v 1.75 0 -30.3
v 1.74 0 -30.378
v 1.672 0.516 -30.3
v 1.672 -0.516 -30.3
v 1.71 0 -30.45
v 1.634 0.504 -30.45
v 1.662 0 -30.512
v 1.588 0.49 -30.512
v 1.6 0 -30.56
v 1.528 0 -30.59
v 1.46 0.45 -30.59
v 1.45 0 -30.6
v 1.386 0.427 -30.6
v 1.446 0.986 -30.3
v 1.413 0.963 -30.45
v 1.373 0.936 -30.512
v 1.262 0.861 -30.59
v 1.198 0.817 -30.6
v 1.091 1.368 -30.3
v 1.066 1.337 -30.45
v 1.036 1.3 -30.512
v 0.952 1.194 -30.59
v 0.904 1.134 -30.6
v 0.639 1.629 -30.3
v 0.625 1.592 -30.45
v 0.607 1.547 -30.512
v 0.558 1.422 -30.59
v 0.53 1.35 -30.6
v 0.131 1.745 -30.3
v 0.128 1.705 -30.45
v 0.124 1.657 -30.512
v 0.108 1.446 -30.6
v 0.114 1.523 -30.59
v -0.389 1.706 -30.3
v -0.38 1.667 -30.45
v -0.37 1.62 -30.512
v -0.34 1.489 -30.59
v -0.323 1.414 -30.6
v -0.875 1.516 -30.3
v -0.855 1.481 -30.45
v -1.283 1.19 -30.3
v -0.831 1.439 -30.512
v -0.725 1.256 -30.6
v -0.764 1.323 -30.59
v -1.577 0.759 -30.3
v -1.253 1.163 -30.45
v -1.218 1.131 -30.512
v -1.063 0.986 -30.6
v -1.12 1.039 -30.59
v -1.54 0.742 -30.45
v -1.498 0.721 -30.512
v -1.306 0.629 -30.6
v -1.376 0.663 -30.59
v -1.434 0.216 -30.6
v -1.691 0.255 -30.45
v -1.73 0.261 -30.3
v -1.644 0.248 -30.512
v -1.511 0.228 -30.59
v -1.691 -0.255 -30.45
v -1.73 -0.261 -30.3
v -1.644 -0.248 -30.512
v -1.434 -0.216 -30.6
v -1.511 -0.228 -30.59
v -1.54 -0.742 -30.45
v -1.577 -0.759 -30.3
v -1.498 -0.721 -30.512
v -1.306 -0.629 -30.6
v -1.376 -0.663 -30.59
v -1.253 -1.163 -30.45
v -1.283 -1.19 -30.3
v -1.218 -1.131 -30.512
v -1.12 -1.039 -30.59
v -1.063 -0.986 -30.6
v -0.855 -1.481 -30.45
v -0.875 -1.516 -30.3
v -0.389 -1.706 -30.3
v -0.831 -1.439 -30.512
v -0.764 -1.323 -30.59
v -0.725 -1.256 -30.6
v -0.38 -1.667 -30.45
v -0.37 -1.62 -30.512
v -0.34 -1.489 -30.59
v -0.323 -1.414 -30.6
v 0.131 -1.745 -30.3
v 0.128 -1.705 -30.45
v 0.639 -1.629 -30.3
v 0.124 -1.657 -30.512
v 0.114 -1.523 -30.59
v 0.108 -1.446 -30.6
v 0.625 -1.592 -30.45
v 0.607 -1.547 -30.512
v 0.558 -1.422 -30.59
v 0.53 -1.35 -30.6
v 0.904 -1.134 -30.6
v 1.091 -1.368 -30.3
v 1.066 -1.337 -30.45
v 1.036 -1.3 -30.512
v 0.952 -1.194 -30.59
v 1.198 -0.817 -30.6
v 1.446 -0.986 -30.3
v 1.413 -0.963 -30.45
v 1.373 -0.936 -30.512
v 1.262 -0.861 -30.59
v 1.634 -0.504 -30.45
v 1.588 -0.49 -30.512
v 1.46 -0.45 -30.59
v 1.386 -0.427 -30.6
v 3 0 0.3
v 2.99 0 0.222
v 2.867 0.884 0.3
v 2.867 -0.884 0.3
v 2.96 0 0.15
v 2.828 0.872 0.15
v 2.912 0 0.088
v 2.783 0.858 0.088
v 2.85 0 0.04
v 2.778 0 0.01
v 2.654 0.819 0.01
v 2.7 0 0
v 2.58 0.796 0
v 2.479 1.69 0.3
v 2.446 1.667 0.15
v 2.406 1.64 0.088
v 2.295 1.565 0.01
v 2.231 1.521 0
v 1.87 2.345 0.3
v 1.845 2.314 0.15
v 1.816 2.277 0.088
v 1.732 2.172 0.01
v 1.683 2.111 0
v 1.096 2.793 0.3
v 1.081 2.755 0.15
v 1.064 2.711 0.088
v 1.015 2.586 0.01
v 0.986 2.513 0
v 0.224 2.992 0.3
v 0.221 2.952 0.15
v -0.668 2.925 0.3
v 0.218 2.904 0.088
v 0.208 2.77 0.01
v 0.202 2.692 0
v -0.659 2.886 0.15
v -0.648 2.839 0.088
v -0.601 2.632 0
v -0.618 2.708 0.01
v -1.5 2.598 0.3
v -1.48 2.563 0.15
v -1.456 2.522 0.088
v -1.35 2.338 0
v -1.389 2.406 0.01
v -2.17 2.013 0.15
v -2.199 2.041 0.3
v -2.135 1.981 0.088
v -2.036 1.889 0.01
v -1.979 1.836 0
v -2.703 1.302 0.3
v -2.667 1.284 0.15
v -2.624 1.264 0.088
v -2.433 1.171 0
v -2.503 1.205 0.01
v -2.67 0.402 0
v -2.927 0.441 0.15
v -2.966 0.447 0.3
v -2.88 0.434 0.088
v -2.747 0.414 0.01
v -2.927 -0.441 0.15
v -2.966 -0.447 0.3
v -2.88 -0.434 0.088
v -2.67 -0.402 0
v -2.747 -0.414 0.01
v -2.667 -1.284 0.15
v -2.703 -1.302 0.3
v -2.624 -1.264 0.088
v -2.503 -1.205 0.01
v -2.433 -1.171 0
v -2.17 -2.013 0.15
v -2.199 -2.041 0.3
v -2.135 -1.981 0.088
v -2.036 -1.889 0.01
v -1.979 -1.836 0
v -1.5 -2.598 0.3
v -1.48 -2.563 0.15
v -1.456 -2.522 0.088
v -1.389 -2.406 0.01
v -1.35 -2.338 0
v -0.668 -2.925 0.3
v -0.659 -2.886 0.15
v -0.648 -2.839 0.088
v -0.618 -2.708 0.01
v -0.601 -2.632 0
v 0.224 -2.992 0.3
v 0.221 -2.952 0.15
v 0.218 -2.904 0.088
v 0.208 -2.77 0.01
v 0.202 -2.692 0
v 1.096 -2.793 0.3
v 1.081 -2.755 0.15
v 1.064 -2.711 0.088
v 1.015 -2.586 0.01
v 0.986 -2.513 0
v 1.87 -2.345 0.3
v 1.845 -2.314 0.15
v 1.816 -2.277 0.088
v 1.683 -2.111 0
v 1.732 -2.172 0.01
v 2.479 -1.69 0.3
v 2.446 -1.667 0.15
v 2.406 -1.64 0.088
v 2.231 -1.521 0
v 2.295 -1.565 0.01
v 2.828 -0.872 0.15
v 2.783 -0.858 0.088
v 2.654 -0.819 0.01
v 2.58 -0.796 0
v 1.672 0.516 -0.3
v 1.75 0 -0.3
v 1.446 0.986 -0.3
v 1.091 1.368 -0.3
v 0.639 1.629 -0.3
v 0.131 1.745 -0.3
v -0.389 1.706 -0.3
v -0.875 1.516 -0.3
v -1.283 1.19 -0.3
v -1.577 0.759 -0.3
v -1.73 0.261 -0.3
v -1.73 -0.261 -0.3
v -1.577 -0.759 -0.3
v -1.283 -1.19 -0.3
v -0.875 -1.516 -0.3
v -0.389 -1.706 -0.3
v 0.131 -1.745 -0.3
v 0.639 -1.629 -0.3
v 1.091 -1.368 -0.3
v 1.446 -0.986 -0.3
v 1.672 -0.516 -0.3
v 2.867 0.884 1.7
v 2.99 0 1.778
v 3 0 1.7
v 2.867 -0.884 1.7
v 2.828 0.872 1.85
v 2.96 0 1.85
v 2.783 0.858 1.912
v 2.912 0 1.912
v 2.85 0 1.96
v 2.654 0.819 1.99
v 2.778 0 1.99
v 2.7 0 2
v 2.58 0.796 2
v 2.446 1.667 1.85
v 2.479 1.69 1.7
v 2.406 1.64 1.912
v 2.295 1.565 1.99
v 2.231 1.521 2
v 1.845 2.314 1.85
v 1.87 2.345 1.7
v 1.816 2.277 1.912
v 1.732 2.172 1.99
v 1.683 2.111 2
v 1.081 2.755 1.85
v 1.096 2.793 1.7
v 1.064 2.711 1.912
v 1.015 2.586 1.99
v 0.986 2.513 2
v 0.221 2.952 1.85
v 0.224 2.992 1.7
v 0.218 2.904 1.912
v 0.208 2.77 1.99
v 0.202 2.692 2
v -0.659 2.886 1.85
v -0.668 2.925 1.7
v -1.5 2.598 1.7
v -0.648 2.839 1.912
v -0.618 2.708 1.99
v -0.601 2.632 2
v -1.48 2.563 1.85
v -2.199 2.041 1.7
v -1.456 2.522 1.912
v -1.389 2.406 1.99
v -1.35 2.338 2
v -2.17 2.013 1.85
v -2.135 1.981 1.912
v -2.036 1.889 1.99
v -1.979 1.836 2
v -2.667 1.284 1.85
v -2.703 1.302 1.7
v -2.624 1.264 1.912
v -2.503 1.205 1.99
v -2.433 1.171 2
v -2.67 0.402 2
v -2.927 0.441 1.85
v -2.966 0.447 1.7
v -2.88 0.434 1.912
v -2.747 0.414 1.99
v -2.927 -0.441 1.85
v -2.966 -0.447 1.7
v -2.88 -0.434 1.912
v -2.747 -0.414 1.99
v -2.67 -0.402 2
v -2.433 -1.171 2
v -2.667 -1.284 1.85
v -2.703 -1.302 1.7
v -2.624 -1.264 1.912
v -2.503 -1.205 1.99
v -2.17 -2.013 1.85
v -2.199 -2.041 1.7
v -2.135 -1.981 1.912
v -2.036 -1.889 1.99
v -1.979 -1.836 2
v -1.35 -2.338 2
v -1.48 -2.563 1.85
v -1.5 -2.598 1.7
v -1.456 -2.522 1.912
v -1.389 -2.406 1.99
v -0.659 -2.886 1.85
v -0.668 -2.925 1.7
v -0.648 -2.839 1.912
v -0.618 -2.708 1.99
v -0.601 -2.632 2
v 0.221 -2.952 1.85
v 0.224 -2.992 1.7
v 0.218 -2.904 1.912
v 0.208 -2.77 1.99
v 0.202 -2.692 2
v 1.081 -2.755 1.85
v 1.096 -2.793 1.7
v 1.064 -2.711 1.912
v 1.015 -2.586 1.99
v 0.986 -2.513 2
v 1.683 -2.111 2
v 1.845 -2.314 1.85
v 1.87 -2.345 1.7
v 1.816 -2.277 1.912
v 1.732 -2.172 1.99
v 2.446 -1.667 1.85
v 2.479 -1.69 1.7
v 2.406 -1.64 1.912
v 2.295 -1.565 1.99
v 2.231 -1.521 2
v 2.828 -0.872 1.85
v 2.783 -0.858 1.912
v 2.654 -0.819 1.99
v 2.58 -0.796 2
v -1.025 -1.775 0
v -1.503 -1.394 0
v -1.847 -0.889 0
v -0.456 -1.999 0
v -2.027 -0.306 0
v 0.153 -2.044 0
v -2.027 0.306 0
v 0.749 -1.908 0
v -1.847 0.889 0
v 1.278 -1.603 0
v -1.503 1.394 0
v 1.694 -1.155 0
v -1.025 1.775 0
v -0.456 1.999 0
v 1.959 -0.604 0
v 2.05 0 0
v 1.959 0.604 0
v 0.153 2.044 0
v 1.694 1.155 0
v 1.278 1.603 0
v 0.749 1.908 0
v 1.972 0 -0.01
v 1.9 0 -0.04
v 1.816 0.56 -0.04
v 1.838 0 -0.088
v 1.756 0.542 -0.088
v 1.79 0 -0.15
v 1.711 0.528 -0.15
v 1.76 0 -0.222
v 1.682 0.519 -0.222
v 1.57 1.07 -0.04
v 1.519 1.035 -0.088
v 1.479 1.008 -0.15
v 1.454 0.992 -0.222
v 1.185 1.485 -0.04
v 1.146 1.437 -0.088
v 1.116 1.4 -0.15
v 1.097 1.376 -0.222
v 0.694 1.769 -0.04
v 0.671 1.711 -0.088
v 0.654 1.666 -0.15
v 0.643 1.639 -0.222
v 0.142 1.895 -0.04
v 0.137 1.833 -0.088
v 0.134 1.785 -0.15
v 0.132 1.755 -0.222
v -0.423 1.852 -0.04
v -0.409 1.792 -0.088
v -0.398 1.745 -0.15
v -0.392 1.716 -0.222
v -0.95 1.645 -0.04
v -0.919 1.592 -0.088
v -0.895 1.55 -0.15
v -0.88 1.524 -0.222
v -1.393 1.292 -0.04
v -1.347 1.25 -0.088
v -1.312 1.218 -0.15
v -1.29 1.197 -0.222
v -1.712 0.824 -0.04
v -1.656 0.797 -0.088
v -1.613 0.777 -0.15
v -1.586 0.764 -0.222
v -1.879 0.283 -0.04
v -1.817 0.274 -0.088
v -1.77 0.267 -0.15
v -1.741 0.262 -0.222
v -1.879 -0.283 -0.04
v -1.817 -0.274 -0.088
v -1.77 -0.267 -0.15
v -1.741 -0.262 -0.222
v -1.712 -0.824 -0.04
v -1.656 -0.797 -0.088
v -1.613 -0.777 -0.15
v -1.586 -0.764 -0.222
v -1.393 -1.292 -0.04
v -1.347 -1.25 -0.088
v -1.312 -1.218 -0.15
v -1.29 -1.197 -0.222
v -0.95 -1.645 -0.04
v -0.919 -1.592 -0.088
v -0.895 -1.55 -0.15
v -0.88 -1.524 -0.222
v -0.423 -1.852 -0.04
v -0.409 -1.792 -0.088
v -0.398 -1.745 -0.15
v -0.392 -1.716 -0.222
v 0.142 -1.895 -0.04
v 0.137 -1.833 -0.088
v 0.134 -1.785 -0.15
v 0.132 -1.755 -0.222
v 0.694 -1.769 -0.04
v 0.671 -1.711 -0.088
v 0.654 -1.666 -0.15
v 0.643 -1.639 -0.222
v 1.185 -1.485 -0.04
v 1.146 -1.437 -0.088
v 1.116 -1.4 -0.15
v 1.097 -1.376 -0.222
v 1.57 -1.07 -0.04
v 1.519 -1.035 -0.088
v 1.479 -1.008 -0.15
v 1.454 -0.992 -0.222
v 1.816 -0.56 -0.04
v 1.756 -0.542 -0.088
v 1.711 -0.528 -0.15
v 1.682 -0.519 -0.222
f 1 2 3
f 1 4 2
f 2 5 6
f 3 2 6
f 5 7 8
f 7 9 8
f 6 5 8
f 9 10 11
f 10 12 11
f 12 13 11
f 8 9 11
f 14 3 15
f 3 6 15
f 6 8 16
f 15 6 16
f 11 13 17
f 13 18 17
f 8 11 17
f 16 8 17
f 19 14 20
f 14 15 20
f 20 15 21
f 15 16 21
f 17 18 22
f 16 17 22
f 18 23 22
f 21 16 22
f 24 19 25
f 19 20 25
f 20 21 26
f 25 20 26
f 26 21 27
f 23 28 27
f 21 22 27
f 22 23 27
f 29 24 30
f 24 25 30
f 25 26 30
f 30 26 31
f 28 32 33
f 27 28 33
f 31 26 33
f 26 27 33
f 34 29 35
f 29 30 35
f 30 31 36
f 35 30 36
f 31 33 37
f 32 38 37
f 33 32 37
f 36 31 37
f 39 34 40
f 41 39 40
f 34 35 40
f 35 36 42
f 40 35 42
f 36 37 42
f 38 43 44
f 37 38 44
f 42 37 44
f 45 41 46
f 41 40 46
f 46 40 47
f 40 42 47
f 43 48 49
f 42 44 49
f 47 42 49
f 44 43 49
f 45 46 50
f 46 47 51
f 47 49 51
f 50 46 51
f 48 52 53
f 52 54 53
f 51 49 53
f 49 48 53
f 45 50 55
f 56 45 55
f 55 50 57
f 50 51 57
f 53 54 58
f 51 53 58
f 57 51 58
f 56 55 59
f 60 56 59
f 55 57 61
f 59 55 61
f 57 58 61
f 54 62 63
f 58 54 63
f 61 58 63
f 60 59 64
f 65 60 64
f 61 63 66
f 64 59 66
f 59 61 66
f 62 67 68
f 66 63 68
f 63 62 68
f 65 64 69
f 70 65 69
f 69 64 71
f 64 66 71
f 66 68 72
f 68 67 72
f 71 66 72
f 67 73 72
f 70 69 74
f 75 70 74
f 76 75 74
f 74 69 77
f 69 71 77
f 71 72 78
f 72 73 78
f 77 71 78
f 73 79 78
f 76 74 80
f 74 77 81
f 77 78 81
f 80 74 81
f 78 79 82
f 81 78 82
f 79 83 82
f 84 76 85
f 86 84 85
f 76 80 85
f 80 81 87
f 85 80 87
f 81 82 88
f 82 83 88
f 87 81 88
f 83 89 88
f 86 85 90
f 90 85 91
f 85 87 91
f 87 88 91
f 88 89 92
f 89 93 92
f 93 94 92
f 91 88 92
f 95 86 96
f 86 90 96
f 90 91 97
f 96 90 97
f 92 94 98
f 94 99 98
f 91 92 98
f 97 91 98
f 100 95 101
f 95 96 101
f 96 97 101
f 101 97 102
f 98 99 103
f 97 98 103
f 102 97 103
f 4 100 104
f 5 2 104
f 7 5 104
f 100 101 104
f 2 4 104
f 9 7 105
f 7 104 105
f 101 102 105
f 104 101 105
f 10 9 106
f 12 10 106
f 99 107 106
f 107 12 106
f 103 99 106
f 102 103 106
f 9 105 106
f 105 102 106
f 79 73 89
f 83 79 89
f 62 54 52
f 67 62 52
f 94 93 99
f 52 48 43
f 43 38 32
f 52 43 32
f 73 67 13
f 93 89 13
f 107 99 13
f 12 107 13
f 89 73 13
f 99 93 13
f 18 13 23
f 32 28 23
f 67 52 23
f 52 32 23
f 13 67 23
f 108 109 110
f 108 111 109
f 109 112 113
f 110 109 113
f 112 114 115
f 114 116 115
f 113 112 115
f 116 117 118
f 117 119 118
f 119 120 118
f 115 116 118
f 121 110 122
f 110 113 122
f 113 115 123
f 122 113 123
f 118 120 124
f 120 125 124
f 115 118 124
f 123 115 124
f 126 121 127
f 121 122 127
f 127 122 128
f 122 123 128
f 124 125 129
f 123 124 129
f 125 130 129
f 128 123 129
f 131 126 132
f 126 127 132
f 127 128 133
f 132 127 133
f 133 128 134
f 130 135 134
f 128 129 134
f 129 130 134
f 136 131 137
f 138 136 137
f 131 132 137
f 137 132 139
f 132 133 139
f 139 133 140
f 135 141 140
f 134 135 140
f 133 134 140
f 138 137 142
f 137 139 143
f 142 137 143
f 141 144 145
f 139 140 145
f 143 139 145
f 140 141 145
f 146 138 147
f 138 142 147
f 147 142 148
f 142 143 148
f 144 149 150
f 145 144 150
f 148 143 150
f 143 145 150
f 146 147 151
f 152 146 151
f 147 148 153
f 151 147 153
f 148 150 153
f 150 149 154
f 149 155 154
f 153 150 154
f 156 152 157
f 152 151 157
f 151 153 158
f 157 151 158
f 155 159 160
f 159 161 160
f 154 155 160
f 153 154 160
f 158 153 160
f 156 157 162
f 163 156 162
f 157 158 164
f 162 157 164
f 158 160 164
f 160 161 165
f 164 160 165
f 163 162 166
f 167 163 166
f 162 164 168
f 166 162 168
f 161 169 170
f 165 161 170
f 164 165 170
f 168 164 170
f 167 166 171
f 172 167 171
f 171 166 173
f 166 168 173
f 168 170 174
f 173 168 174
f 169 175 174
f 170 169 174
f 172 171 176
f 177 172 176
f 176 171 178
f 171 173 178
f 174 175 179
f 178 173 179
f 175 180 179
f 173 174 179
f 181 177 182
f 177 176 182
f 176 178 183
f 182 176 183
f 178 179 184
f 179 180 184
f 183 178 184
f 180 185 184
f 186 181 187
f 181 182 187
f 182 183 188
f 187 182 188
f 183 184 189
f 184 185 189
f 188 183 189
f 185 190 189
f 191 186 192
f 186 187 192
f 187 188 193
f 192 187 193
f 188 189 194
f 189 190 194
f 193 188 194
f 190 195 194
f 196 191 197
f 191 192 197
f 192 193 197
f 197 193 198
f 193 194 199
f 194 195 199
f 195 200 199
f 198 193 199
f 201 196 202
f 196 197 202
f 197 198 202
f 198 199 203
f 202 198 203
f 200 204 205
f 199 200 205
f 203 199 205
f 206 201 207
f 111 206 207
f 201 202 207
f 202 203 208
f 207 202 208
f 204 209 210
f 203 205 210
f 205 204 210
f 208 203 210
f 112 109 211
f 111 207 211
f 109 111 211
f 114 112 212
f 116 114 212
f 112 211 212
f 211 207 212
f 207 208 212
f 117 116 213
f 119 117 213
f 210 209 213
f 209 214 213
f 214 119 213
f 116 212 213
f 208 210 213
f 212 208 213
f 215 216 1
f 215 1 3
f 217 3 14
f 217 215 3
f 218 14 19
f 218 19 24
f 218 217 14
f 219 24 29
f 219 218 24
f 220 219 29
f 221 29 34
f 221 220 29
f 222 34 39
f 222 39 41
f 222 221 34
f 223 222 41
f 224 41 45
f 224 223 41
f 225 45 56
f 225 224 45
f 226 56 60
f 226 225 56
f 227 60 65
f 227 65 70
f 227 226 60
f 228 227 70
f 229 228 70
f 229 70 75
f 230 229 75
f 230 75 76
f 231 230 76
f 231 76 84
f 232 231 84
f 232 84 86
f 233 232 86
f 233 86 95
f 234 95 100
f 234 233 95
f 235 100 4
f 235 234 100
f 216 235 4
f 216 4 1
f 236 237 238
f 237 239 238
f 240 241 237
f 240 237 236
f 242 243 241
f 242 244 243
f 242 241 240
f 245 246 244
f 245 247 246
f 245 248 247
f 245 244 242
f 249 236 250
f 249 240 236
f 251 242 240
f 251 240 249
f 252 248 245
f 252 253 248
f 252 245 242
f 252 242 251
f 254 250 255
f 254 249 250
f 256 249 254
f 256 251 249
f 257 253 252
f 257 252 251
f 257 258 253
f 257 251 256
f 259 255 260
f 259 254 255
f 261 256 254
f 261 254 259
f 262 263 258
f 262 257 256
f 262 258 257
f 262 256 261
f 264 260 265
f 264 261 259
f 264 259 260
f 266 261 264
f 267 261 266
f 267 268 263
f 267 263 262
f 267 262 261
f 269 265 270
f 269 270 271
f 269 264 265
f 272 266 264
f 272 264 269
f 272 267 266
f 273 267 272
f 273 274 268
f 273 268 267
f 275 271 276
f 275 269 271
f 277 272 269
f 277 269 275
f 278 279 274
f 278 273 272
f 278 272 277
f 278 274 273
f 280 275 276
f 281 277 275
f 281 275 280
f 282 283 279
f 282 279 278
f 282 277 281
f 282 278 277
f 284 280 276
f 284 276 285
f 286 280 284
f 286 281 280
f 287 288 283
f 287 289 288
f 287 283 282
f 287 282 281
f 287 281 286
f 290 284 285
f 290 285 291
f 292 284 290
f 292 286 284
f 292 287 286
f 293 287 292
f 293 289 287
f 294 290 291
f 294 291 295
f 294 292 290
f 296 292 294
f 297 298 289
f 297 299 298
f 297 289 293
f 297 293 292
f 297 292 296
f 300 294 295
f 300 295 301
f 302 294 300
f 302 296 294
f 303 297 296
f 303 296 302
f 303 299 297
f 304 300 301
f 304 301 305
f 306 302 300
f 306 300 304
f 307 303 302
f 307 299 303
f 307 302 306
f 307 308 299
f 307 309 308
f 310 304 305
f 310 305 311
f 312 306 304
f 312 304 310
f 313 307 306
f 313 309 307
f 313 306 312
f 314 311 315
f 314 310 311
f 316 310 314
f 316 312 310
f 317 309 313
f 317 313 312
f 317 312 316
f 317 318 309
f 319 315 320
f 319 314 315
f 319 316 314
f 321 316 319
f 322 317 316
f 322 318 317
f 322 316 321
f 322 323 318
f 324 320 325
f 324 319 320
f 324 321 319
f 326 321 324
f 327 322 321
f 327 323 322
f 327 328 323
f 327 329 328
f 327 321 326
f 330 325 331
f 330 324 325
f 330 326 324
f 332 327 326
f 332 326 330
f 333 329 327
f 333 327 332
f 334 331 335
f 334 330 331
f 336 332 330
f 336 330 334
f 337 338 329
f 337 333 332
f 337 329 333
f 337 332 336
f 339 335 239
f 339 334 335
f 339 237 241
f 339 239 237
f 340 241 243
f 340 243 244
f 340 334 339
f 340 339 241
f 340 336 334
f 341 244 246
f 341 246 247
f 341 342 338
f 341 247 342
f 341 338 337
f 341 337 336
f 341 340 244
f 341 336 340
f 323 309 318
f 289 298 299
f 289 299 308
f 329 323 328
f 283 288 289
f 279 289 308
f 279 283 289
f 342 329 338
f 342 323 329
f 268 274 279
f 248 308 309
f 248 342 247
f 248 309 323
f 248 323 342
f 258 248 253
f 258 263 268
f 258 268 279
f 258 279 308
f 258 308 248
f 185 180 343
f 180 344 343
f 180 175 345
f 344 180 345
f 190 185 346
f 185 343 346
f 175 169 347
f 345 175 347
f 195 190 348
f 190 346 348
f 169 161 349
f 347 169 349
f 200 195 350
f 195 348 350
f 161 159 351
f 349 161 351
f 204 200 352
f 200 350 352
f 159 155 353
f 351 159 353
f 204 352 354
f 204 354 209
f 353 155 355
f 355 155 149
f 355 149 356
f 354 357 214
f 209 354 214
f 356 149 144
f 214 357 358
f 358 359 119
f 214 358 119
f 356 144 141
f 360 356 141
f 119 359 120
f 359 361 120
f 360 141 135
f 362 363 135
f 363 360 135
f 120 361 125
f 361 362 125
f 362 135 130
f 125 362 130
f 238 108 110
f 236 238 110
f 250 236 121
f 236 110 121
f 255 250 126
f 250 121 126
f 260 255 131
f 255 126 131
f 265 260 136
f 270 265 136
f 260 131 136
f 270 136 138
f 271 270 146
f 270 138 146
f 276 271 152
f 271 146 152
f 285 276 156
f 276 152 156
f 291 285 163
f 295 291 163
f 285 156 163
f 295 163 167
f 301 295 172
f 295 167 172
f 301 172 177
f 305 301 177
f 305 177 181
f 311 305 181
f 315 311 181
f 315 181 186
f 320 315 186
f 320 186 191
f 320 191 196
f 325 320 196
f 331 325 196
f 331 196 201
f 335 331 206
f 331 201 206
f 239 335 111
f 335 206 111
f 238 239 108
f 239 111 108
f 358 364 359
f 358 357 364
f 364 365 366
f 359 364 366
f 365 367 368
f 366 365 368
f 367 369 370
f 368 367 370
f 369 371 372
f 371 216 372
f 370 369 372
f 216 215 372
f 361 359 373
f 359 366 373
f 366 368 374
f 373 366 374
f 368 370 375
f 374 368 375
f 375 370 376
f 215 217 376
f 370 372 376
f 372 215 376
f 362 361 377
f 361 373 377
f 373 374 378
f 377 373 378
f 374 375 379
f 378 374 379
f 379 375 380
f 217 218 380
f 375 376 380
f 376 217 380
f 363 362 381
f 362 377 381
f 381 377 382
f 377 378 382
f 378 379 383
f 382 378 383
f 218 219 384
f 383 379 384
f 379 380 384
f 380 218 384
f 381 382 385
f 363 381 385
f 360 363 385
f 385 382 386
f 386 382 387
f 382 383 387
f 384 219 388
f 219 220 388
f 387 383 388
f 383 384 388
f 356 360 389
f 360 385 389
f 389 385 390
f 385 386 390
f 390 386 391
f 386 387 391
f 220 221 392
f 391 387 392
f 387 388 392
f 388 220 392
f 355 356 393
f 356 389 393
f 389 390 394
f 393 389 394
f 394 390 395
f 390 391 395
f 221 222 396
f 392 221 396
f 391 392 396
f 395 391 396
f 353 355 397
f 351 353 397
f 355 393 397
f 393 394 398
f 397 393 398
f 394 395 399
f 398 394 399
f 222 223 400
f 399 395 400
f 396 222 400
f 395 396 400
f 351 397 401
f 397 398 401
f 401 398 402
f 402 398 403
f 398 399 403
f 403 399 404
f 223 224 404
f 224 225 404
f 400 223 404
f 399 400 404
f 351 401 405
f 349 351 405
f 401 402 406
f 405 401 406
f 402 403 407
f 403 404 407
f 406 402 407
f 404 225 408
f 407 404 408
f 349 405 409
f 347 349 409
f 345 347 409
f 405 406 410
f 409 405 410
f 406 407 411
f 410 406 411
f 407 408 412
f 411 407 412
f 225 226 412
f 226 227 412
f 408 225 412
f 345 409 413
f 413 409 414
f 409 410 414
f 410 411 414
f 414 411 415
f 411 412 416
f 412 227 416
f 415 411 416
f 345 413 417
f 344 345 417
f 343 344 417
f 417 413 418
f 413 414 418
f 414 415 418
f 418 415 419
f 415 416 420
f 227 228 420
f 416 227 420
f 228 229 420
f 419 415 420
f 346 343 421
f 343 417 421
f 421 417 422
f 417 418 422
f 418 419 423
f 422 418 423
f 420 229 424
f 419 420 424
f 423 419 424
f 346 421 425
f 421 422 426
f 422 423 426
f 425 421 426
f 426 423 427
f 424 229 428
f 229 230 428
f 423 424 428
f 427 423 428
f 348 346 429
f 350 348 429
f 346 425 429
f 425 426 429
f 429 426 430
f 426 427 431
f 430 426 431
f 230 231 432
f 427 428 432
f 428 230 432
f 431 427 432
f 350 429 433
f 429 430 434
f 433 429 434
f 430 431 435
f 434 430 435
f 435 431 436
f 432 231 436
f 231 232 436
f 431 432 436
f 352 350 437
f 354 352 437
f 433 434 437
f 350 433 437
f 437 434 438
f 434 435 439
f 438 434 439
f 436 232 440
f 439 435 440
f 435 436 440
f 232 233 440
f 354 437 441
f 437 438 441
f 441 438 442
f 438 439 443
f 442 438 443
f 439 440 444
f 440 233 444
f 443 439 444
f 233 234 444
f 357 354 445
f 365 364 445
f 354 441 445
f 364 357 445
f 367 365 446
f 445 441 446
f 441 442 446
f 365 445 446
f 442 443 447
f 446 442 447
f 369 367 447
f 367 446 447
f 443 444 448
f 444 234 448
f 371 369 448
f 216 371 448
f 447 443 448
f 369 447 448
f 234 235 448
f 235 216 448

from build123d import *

# Parameters (mm, degrees)
SKETCH_1_R      = 3
EXTRUDE_1_DEPTH = 2
SKETCH_1_3_R    = 1.75
EXTRUDE_2_DEPTH = 30.6
FILLET_1_R      = 0.3


with BuildPart() as part:
    # 草图1 → 凸台-拉伸1 (new body)
    with BuildSketch(Plane.XY):
        Circle(SKETCH_1_R)
    extrude(amount=EXTRUDE_1_DEPTH)

    # 草图1<3> → 凸台-拉伸2 (add)
    with BuildSketch(Plane.XY):
        Circle(SKETCH_1_3_R)
    extrude(amount=-EXTRUDE_2_DEPTH)

    # 圆角1
    fillet_1_edges = [part.edges().sort_by_distance(p)[0] for p in [
        (-3, 0, 0),
        (-1.75, 0, 0),
        (-3, 0, 2),
        (-1.75, 0, -30.6),
    ]]
    fillet(fillet_1_edges, radius=FILLET_1_R)


solid = part.part
